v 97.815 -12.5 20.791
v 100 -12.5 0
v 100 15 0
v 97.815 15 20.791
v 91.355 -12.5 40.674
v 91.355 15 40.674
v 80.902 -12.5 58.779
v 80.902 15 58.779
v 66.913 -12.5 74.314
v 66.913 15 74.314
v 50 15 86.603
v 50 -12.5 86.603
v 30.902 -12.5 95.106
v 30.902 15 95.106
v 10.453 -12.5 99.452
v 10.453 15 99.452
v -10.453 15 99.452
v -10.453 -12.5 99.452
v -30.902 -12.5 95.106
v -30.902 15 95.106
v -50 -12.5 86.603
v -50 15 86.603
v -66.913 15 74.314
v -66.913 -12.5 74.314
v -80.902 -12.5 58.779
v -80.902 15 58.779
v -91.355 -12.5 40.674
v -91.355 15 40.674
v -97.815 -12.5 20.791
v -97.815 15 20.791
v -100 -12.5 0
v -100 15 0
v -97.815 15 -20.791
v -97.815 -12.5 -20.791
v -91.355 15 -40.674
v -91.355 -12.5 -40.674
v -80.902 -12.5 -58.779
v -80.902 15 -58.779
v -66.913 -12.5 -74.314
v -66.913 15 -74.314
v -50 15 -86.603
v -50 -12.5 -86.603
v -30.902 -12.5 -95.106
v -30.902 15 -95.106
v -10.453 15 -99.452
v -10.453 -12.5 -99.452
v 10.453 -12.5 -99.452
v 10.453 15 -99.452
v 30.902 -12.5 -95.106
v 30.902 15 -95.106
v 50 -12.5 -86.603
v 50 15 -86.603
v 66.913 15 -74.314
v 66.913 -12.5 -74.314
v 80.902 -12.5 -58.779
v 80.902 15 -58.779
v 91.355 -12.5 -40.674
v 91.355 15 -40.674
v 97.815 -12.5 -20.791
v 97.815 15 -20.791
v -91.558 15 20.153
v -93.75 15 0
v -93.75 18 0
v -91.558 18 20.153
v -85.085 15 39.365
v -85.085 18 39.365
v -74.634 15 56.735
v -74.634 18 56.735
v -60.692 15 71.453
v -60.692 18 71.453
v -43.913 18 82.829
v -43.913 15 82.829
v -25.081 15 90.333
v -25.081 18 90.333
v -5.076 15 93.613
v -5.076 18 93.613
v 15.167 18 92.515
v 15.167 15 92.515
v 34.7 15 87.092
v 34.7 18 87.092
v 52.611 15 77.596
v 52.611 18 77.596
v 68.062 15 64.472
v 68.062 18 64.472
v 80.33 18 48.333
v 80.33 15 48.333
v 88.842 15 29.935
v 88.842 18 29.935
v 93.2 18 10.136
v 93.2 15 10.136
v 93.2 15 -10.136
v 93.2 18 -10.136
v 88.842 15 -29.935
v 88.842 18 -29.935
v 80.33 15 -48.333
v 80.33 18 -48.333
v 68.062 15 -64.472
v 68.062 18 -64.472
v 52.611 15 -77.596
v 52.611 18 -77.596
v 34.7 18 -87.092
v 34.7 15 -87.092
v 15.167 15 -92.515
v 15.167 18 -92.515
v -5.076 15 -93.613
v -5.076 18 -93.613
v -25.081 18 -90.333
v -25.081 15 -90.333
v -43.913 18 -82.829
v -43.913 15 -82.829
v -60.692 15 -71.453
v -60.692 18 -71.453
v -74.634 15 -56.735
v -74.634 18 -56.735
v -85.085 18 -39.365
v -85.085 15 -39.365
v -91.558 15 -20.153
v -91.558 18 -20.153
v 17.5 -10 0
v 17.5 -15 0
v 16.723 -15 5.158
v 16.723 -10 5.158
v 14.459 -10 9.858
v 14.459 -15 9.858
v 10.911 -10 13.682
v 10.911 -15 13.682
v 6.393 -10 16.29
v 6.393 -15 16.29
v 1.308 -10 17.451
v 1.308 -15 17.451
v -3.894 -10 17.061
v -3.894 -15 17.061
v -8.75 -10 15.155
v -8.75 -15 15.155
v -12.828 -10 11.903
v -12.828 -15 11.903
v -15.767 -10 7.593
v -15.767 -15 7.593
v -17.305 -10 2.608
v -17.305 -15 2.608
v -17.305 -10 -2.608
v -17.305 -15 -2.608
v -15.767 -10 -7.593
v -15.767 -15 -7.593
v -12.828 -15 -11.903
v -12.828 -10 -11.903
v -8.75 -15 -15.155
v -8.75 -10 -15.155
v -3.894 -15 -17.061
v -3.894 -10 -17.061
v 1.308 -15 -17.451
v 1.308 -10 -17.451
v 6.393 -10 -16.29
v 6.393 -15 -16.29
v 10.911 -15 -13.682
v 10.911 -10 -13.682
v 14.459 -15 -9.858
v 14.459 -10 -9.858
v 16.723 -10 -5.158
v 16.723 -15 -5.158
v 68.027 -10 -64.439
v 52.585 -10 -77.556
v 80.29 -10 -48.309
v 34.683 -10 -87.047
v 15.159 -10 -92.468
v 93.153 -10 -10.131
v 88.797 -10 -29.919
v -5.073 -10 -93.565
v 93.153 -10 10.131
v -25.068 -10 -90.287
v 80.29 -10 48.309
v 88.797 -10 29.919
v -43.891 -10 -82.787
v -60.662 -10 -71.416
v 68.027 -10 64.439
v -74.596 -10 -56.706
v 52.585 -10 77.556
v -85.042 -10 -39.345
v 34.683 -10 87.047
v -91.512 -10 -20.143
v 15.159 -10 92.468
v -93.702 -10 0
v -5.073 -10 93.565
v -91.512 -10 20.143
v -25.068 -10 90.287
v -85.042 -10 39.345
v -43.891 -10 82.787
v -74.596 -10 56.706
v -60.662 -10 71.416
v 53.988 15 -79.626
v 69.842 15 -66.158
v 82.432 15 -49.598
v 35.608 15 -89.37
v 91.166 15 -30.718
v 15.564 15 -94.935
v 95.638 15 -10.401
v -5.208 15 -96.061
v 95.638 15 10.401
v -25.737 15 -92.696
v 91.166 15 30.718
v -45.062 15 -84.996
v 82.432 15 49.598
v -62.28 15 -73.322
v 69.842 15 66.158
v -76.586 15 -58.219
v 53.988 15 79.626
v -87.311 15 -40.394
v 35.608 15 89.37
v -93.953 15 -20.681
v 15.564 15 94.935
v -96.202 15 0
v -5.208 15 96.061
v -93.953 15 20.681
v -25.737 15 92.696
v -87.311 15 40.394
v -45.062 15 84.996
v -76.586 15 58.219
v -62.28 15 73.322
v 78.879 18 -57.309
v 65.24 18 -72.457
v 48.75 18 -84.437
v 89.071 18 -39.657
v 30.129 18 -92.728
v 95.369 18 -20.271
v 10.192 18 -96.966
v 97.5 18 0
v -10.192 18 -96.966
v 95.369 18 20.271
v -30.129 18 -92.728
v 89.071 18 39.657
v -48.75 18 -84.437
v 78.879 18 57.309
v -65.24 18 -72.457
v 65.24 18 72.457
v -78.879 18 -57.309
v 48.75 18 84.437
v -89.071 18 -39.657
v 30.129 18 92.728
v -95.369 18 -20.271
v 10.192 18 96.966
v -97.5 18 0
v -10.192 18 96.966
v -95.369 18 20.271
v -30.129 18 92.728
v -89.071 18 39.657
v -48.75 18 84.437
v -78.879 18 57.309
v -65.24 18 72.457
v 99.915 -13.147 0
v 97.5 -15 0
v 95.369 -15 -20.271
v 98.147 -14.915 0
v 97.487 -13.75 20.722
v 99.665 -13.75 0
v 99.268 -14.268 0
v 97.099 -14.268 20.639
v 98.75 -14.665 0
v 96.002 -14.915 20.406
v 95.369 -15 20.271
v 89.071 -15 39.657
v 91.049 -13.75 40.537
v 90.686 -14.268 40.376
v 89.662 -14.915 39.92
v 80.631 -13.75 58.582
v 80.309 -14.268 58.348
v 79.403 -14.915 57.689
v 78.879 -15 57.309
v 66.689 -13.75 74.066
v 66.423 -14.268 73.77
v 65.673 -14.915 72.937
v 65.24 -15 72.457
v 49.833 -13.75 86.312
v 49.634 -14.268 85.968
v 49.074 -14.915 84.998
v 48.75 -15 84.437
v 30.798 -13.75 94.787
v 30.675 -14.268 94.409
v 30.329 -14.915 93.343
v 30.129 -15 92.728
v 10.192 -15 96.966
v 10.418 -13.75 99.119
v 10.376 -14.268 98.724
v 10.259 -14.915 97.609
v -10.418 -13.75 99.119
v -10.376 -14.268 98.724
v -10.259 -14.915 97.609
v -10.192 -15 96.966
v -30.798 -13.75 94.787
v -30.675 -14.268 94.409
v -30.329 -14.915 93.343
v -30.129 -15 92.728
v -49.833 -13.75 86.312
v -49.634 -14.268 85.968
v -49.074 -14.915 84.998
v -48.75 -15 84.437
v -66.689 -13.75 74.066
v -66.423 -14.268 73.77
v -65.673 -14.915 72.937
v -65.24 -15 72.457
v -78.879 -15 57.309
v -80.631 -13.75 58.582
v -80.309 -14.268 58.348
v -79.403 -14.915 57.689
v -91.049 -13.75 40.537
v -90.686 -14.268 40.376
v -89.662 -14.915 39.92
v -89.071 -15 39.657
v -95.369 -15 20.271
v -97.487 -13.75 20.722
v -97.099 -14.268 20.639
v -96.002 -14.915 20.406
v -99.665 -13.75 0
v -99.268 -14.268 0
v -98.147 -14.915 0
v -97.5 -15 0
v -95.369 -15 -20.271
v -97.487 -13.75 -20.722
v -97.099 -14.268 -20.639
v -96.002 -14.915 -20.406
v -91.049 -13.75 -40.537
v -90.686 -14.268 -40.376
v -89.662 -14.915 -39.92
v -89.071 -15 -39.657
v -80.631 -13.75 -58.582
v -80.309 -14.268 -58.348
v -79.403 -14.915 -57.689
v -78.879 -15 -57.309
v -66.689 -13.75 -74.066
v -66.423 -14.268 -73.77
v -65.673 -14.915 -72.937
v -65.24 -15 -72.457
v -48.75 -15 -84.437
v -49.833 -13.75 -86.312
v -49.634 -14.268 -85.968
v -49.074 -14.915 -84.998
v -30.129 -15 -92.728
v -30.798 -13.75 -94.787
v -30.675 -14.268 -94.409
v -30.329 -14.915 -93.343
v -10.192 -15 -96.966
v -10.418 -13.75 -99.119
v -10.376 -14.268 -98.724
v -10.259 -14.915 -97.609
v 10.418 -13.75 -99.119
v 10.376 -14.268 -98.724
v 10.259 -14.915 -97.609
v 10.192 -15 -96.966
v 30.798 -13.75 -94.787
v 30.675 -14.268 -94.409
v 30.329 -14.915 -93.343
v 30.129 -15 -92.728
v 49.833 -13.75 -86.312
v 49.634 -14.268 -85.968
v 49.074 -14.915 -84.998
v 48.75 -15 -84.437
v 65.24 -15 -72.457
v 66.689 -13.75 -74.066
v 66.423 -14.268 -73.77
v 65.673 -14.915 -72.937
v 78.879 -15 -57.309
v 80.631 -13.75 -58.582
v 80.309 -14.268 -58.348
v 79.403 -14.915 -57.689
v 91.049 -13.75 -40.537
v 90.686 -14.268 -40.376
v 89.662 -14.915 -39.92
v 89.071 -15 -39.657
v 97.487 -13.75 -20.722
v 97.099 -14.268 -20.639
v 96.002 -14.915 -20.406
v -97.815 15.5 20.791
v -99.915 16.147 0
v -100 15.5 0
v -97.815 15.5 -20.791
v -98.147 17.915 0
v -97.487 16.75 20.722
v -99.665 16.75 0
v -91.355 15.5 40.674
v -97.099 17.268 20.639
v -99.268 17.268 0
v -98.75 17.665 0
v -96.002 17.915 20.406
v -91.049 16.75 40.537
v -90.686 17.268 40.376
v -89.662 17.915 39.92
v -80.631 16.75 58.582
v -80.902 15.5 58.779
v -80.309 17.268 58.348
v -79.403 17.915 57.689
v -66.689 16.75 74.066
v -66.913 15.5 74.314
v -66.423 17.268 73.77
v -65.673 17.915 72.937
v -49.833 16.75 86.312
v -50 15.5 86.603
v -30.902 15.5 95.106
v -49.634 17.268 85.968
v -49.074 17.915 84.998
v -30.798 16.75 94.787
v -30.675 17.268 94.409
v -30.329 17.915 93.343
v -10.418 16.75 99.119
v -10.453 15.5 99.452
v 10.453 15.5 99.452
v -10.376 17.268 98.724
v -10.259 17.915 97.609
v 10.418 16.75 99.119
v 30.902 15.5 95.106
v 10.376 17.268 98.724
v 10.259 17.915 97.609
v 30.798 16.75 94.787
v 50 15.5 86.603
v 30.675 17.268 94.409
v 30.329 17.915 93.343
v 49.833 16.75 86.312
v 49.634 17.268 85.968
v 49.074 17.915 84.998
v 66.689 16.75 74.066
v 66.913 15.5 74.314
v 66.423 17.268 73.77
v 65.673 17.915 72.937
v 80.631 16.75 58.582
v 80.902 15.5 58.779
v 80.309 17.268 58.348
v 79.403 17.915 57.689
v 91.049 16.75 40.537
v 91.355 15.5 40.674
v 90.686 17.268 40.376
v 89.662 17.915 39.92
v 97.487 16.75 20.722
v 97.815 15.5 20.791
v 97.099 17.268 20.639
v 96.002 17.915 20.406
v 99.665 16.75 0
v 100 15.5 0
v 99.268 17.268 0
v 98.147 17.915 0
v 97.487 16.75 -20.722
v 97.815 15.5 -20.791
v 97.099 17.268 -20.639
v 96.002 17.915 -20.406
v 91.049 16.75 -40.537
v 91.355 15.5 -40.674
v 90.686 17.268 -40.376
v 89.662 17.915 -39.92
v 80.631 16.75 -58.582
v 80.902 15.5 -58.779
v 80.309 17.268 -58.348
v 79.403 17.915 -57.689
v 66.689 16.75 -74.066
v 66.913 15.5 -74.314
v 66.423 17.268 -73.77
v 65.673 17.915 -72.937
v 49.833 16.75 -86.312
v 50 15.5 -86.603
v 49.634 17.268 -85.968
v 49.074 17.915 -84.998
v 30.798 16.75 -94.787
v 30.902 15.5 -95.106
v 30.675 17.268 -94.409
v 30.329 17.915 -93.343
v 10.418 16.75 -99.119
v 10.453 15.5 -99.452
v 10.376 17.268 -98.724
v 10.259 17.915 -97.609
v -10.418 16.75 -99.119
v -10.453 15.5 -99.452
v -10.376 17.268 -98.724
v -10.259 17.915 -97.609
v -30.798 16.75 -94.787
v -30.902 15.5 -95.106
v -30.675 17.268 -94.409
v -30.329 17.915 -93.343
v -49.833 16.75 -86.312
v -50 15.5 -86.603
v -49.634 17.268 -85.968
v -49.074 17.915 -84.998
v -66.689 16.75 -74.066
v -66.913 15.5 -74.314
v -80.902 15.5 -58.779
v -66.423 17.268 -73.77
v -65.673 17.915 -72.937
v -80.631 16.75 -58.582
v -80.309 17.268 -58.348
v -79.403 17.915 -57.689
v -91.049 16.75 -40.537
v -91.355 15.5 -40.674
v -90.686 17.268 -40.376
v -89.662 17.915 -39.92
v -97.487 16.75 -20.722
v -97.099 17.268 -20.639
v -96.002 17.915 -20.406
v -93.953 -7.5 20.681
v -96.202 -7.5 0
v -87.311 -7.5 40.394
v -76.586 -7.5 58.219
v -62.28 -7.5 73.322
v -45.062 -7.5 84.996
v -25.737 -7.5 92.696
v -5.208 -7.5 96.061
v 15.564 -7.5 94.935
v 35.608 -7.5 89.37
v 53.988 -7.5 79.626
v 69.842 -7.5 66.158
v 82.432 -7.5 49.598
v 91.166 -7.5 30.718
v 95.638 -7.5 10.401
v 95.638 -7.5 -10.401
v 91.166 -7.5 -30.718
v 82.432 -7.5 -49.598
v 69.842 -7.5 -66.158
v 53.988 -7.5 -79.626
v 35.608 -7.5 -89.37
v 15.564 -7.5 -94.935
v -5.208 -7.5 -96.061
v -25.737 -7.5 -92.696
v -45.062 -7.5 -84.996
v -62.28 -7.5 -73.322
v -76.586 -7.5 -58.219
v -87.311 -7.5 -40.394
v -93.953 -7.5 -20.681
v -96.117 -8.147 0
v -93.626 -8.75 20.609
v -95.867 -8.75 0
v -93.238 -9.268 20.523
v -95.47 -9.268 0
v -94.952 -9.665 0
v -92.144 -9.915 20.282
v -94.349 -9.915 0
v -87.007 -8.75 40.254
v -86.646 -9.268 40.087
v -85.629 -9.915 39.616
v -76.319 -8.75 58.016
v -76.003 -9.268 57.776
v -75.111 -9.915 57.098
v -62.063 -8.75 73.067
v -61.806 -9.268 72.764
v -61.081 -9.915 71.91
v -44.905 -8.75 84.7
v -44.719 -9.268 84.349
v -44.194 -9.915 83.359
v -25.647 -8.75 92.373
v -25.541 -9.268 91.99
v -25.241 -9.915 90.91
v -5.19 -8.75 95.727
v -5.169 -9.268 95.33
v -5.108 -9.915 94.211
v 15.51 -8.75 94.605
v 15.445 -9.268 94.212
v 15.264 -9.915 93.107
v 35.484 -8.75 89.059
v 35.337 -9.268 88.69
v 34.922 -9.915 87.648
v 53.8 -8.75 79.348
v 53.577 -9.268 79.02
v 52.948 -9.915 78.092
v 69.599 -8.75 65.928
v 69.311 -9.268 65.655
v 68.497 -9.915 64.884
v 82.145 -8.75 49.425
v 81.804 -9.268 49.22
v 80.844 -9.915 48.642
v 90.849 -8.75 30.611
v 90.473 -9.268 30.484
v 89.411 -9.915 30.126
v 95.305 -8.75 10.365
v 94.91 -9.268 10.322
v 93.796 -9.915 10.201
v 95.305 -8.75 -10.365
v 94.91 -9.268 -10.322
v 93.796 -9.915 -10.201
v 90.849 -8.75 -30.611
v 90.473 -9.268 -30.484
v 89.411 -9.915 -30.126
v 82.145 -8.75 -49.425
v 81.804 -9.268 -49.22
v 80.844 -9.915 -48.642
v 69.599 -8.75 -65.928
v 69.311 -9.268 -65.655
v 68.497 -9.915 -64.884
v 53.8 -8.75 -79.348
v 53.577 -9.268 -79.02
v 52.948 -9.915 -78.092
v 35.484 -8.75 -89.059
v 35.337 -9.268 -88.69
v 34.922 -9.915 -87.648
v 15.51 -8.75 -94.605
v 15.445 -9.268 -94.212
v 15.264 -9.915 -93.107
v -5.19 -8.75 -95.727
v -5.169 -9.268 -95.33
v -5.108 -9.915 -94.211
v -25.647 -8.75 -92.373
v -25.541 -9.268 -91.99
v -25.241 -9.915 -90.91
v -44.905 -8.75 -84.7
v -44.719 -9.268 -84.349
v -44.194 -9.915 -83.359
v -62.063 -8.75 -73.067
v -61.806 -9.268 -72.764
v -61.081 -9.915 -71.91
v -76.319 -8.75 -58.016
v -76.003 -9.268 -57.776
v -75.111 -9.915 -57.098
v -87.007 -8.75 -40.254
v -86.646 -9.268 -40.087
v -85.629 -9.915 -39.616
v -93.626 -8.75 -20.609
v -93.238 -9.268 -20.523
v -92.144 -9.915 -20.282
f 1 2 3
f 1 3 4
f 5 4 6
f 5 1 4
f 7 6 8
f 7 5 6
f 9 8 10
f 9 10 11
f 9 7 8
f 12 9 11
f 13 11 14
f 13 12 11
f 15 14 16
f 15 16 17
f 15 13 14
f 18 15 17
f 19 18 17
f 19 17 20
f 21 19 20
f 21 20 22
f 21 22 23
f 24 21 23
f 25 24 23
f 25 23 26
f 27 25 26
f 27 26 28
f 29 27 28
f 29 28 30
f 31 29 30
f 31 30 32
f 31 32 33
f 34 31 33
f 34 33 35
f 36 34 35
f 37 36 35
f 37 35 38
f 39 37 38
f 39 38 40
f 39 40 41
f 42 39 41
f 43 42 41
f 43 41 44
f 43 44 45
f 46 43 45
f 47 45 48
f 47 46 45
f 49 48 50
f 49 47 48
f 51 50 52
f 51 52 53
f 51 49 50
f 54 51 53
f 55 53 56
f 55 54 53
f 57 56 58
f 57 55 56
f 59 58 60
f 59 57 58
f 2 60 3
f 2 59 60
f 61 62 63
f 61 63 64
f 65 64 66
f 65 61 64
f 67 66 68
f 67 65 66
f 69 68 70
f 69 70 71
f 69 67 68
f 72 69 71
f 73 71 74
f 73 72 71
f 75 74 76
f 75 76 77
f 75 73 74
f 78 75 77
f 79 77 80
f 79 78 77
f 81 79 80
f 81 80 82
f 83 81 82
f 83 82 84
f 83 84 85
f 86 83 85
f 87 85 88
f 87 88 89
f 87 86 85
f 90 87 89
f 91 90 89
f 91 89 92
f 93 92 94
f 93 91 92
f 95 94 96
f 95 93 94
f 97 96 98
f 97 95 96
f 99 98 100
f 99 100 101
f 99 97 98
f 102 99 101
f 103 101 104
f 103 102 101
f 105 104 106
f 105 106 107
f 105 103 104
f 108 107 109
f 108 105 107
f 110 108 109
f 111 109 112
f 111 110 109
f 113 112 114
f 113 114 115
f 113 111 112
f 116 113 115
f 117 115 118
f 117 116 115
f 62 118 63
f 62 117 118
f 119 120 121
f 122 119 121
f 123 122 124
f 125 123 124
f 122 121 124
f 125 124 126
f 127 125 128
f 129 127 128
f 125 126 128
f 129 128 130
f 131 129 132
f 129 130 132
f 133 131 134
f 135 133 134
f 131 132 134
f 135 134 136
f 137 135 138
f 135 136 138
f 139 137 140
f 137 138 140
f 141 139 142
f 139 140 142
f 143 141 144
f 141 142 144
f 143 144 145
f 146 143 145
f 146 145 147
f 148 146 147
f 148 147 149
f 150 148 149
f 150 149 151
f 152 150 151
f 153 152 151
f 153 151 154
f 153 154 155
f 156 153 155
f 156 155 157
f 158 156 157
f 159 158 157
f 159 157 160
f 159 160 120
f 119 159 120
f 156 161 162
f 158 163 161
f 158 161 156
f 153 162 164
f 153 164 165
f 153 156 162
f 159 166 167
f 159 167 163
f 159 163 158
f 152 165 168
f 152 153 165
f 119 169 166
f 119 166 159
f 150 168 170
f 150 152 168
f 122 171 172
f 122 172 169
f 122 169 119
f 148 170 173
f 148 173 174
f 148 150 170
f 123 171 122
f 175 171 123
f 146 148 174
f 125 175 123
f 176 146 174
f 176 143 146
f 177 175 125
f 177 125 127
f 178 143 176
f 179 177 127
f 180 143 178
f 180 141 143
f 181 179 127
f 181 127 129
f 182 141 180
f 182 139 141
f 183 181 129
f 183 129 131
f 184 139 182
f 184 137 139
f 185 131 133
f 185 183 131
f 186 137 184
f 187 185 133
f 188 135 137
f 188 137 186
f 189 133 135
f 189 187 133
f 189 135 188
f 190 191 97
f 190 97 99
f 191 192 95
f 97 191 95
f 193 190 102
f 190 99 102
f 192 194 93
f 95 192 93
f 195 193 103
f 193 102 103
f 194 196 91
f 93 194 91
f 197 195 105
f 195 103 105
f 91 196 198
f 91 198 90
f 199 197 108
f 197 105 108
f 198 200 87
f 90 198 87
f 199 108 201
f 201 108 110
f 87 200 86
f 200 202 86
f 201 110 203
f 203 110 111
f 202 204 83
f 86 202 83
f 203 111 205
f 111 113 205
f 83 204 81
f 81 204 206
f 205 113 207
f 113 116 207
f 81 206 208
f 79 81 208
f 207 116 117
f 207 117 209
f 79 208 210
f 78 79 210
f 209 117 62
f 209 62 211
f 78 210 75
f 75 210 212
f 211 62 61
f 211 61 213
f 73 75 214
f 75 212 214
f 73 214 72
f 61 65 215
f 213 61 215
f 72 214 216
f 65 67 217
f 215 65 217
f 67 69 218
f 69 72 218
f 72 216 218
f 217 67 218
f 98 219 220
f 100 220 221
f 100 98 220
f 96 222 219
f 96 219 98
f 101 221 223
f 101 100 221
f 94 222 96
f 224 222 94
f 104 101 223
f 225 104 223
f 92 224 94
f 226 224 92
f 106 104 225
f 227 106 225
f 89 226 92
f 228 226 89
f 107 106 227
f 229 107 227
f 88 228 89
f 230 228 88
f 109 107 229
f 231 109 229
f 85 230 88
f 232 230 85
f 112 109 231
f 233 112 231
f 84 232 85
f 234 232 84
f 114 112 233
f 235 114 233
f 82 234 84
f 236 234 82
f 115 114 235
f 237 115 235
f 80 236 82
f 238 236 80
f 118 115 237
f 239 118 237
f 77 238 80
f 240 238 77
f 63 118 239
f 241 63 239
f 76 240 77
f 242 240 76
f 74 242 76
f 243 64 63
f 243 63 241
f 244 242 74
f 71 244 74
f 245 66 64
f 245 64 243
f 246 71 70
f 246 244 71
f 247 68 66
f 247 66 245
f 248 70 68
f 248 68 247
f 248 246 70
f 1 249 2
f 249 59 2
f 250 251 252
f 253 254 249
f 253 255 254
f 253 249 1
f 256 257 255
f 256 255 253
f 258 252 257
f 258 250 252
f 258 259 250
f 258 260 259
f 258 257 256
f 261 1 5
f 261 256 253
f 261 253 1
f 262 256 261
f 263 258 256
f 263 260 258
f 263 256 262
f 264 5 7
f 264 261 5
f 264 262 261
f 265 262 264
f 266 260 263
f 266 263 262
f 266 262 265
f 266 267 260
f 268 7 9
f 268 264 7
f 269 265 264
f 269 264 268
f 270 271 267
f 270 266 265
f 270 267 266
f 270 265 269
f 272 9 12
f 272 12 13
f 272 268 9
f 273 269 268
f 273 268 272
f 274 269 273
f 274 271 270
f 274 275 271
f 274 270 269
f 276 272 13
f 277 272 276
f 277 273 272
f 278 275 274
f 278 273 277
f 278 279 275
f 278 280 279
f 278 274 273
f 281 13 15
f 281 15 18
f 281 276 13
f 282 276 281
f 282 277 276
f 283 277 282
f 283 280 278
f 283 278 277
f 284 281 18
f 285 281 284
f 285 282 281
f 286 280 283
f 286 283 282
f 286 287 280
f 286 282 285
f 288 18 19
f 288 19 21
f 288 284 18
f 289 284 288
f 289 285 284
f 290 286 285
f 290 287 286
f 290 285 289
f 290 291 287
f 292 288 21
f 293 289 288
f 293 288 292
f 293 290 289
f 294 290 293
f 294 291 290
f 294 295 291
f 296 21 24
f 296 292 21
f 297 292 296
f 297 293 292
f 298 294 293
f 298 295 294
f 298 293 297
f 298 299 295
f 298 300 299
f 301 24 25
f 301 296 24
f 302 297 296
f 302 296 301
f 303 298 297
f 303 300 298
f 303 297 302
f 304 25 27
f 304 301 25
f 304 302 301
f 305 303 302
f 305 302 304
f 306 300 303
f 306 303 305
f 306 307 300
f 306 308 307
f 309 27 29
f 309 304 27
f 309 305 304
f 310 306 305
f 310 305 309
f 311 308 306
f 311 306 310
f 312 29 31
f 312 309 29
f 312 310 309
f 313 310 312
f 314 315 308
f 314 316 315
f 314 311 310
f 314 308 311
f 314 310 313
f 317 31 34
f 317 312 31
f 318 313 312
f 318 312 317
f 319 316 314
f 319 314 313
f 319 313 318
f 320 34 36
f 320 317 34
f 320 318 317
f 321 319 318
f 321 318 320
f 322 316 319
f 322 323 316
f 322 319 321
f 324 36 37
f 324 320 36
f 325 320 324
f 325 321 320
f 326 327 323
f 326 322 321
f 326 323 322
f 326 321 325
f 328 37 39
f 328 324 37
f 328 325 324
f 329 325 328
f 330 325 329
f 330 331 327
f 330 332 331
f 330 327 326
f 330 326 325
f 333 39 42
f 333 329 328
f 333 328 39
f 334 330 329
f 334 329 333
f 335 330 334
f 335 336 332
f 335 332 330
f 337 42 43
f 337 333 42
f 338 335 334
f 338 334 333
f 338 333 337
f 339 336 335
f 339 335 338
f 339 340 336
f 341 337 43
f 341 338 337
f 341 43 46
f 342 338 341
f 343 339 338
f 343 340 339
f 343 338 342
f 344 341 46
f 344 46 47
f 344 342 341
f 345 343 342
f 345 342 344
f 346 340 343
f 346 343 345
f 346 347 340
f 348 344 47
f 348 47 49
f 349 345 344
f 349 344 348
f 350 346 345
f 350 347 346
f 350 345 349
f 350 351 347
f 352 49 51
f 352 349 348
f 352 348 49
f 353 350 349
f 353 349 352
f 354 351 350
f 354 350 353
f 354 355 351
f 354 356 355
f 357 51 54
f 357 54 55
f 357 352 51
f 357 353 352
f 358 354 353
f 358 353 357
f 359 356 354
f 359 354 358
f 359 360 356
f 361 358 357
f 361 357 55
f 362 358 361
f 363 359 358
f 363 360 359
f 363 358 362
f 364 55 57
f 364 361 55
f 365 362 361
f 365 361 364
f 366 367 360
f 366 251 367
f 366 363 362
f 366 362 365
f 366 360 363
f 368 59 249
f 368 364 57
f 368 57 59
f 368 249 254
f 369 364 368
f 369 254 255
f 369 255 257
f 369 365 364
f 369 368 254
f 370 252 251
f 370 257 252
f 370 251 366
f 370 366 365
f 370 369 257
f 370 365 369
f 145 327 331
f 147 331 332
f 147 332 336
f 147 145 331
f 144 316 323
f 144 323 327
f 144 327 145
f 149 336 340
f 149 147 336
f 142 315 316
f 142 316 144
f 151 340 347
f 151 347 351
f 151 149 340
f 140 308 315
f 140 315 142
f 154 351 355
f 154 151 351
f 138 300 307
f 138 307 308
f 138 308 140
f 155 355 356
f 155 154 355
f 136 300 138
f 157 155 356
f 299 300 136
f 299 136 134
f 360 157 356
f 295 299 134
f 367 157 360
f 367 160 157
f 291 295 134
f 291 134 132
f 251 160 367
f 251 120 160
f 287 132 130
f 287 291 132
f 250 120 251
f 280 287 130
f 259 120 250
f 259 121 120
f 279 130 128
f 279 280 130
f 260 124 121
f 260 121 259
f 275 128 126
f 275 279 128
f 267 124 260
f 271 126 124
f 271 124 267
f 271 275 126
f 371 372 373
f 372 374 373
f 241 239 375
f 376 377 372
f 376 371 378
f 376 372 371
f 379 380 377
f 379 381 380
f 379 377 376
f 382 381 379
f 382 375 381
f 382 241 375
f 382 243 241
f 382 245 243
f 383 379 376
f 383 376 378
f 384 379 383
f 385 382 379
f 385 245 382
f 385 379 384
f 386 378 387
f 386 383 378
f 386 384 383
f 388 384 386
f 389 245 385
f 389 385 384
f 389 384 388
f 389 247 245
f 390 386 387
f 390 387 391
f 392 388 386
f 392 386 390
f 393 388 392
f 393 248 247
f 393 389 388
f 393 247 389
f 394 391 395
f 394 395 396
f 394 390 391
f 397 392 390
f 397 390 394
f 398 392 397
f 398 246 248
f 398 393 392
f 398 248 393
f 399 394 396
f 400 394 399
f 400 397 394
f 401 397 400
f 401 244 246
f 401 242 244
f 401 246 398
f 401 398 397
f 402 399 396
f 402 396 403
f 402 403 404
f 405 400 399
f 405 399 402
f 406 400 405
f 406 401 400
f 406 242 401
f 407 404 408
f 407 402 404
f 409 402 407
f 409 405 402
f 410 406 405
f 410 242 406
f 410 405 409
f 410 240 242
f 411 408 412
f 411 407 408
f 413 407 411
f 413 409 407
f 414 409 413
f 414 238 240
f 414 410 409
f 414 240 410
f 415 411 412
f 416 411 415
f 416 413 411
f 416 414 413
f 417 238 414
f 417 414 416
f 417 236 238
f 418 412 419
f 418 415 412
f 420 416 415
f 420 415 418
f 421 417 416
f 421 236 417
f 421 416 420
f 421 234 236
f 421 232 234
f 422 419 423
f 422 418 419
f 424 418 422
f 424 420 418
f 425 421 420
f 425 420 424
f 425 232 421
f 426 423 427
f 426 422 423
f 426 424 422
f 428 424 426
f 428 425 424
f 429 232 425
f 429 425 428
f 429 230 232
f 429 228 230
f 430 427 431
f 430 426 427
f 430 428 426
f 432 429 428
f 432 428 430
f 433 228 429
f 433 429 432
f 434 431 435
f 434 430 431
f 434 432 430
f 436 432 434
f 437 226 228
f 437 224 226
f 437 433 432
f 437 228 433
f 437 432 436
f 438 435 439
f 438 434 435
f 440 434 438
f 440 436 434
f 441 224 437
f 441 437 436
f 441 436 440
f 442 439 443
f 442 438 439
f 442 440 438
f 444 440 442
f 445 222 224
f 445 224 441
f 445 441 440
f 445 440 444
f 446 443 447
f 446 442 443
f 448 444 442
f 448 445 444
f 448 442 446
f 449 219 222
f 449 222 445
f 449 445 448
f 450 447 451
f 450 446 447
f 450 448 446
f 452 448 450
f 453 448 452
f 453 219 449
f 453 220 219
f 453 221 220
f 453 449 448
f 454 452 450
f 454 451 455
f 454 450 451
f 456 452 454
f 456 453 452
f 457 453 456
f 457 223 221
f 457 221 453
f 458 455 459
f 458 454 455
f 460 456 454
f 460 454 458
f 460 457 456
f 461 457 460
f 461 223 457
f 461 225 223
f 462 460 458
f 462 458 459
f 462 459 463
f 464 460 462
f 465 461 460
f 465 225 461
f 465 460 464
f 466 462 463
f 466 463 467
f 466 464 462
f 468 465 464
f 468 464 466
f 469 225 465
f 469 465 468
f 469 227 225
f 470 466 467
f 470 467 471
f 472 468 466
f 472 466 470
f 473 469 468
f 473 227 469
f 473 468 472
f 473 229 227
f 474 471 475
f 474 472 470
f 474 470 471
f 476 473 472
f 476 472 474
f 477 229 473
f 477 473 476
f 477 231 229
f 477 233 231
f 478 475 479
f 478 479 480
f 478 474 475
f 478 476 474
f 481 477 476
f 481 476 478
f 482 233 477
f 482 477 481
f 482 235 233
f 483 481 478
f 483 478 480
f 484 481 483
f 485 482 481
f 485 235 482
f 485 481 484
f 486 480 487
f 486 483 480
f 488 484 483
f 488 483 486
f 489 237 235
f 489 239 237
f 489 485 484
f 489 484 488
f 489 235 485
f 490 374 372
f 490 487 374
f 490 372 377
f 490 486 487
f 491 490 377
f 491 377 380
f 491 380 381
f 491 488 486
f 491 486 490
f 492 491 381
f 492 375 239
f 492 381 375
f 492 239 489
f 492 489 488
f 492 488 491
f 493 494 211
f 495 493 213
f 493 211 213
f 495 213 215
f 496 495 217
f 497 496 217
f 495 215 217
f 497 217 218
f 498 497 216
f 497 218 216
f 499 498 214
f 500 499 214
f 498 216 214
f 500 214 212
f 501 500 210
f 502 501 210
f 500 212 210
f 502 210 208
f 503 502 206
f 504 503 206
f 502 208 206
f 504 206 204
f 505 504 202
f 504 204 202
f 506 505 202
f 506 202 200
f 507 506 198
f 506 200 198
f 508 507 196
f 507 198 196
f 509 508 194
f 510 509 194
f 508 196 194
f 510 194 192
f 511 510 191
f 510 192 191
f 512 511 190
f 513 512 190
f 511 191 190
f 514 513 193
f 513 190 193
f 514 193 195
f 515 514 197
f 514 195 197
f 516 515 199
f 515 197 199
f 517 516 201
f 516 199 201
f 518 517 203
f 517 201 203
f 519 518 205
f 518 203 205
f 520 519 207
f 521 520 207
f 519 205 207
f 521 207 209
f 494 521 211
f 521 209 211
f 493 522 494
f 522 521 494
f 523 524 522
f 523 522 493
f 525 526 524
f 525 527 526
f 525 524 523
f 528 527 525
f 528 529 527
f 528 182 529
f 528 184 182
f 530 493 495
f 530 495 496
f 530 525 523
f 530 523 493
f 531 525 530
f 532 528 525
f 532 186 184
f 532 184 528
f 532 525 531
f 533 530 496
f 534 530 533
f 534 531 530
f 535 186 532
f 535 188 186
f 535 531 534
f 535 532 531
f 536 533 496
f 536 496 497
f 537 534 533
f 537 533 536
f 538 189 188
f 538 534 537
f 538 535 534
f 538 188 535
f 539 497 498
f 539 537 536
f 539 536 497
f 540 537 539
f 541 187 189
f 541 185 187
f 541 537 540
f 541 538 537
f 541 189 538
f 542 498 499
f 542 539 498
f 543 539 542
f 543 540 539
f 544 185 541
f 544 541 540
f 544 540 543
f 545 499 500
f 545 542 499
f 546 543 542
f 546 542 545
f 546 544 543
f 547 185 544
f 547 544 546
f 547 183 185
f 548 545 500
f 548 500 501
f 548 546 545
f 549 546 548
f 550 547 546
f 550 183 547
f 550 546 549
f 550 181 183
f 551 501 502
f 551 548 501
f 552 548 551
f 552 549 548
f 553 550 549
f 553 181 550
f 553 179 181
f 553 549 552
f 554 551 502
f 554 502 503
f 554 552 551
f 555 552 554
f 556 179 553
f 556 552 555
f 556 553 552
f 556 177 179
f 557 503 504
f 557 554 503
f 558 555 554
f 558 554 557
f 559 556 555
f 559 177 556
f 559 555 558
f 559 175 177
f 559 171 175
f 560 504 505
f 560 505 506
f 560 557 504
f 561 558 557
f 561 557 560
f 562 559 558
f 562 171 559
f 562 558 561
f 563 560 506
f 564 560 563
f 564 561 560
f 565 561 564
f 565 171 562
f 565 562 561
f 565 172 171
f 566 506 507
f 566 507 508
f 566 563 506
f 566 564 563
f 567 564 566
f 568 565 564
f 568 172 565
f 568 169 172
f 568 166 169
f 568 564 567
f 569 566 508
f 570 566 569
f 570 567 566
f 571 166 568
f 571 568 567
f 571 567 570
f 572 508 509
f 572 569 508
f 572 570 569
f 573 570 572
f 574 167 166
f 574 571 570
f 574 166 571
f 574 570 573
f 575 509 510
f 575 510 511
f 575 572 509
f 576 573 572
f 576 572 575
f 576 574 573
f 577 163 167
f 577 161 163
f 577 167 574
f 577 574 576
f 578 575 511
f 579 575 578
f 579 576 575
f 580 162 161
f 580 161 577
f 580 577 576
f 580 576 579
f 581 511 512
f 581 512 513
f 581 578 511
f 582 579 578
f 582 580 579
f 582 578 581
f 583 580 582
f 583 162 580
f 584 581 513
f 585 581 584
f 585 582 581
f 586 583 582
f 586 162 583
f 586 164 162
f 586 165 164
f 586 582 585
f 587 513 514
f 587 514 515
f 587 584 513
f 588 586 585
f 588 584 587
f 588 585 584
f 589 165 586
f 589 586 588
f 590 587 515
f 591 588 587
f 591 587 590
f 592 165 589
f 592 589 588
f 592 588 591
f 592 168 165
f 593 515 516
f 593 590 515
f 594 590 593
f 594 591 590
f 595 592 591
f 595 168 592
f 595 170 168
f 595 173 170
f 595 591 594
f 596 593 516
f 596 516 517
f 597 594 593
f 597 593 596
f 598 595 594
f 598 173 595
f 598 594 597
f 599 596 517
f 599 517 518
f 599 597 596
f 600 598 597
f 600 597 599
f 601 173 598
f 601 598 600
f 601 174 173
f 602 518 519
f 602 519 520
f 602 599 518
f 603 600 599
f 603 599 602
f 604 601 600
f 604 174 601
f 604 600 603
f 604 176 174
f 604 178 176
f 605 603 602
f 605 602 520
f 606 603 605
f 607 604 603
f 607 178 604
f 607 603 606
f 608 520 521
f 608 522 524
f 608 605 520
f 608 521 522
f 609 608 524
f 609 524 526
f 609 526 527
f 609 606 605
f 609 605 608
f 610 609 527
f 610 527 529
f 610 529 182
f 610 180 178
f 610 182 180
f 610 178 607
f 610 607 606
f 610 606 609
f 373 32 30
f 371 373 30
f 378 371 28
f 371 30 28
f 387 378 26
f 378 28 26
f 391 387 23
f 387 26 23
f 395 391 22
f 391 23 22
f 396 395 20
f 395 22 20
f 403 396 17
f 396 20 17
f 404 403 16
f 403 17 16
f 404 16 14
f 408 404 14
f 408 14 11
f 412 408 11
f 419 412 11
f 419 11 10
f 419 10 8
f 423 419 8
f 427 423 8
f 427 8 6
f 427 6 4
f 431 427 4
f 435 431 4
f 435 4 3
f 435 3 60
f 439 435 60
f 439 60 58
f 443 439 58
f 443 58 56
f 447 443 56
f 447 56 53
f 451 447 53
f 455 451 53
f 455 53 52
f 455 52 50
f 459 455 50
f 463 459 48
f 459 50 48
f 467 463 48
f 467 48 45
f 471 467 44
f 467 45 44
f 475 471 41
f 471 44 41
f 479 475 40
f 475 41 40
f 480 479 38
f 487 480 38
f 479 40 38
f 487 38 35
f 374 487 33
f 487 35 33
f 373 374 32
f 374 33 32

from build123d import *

# Parameters (mm, degrees)
F0_R          = 100
F1_DEPTH      = 15
F1_DEPTH_BACK = 15
F2_R          = 96.202365
F3_DEPTH      = 25
F4_R          = 2.5
F5_R          = 2.5
F6_R          = 17.5
F7_DEPTH      = 30.001
F8_R          = 100
F8_R_2        = 93.75
F9_DEPTH      = 3
F10_R         = 2.5


with BuildPart() as f1:
    # F0 (on Front) → F1 (new body, two sides)
    with BuildSketch(Plane.XZ) as f1_sk:
        Circle(F0_R)
    extrude(amount=F1_DEPTH)
    extrude(f1_sk.sketch, amount=-F1_DEPTH_BACK)

    # F2 (on face) → F3 (cut)
    with BuildSketch(Plane(origin=(0, 15, 0), x_dir=(-1, 0, 0), z_dir=(0, 1, 0))):
        Circle(F2_R)
    extrude(amount=-F3_DEPTH, mode=Mode.SUBTRACT)

    # F4
    f4_edges = [f1.edges().sort_by_distance(p)[0] for p in [
        (96.202365, -10, 0),
    ]]
    fillet(f4_edges, radius=F4_R)

    # F5
    f5_edges = [f1.edges().sort_by_distance(p)[0] for p in [
        (-100, -15, 0),
    ]]
    fillet(f5_edges, radius=F5_R)

    # F6 (on face) → F7 (cut, through all)
    with BuildSketch(Plane.XZ.offset(15)):
        Circle(F6_R)
    extrude(amount=-F7_DEPTH, mode=Mode.SUBTRACT)

    # F8 (on face) → F9 (join)
    with BuildSketch(Plane(origin=(0, 15, 0), x_dir=(-1, 0, 0), z_dir=(0, 1, 0))):
        Circle(F8_R)
        Circle(F8_R_2, mode=Mode.SUBTRACT)
    extrude(amount=F9_DEPTH)

    # F10
    f10_edges = [f1.edges().sort_by_distance(p)[0] for p in [
        (100, 18, 0),
    ]]
    fillet(f10_edges, radius=F10_R)


solid = f1.part
